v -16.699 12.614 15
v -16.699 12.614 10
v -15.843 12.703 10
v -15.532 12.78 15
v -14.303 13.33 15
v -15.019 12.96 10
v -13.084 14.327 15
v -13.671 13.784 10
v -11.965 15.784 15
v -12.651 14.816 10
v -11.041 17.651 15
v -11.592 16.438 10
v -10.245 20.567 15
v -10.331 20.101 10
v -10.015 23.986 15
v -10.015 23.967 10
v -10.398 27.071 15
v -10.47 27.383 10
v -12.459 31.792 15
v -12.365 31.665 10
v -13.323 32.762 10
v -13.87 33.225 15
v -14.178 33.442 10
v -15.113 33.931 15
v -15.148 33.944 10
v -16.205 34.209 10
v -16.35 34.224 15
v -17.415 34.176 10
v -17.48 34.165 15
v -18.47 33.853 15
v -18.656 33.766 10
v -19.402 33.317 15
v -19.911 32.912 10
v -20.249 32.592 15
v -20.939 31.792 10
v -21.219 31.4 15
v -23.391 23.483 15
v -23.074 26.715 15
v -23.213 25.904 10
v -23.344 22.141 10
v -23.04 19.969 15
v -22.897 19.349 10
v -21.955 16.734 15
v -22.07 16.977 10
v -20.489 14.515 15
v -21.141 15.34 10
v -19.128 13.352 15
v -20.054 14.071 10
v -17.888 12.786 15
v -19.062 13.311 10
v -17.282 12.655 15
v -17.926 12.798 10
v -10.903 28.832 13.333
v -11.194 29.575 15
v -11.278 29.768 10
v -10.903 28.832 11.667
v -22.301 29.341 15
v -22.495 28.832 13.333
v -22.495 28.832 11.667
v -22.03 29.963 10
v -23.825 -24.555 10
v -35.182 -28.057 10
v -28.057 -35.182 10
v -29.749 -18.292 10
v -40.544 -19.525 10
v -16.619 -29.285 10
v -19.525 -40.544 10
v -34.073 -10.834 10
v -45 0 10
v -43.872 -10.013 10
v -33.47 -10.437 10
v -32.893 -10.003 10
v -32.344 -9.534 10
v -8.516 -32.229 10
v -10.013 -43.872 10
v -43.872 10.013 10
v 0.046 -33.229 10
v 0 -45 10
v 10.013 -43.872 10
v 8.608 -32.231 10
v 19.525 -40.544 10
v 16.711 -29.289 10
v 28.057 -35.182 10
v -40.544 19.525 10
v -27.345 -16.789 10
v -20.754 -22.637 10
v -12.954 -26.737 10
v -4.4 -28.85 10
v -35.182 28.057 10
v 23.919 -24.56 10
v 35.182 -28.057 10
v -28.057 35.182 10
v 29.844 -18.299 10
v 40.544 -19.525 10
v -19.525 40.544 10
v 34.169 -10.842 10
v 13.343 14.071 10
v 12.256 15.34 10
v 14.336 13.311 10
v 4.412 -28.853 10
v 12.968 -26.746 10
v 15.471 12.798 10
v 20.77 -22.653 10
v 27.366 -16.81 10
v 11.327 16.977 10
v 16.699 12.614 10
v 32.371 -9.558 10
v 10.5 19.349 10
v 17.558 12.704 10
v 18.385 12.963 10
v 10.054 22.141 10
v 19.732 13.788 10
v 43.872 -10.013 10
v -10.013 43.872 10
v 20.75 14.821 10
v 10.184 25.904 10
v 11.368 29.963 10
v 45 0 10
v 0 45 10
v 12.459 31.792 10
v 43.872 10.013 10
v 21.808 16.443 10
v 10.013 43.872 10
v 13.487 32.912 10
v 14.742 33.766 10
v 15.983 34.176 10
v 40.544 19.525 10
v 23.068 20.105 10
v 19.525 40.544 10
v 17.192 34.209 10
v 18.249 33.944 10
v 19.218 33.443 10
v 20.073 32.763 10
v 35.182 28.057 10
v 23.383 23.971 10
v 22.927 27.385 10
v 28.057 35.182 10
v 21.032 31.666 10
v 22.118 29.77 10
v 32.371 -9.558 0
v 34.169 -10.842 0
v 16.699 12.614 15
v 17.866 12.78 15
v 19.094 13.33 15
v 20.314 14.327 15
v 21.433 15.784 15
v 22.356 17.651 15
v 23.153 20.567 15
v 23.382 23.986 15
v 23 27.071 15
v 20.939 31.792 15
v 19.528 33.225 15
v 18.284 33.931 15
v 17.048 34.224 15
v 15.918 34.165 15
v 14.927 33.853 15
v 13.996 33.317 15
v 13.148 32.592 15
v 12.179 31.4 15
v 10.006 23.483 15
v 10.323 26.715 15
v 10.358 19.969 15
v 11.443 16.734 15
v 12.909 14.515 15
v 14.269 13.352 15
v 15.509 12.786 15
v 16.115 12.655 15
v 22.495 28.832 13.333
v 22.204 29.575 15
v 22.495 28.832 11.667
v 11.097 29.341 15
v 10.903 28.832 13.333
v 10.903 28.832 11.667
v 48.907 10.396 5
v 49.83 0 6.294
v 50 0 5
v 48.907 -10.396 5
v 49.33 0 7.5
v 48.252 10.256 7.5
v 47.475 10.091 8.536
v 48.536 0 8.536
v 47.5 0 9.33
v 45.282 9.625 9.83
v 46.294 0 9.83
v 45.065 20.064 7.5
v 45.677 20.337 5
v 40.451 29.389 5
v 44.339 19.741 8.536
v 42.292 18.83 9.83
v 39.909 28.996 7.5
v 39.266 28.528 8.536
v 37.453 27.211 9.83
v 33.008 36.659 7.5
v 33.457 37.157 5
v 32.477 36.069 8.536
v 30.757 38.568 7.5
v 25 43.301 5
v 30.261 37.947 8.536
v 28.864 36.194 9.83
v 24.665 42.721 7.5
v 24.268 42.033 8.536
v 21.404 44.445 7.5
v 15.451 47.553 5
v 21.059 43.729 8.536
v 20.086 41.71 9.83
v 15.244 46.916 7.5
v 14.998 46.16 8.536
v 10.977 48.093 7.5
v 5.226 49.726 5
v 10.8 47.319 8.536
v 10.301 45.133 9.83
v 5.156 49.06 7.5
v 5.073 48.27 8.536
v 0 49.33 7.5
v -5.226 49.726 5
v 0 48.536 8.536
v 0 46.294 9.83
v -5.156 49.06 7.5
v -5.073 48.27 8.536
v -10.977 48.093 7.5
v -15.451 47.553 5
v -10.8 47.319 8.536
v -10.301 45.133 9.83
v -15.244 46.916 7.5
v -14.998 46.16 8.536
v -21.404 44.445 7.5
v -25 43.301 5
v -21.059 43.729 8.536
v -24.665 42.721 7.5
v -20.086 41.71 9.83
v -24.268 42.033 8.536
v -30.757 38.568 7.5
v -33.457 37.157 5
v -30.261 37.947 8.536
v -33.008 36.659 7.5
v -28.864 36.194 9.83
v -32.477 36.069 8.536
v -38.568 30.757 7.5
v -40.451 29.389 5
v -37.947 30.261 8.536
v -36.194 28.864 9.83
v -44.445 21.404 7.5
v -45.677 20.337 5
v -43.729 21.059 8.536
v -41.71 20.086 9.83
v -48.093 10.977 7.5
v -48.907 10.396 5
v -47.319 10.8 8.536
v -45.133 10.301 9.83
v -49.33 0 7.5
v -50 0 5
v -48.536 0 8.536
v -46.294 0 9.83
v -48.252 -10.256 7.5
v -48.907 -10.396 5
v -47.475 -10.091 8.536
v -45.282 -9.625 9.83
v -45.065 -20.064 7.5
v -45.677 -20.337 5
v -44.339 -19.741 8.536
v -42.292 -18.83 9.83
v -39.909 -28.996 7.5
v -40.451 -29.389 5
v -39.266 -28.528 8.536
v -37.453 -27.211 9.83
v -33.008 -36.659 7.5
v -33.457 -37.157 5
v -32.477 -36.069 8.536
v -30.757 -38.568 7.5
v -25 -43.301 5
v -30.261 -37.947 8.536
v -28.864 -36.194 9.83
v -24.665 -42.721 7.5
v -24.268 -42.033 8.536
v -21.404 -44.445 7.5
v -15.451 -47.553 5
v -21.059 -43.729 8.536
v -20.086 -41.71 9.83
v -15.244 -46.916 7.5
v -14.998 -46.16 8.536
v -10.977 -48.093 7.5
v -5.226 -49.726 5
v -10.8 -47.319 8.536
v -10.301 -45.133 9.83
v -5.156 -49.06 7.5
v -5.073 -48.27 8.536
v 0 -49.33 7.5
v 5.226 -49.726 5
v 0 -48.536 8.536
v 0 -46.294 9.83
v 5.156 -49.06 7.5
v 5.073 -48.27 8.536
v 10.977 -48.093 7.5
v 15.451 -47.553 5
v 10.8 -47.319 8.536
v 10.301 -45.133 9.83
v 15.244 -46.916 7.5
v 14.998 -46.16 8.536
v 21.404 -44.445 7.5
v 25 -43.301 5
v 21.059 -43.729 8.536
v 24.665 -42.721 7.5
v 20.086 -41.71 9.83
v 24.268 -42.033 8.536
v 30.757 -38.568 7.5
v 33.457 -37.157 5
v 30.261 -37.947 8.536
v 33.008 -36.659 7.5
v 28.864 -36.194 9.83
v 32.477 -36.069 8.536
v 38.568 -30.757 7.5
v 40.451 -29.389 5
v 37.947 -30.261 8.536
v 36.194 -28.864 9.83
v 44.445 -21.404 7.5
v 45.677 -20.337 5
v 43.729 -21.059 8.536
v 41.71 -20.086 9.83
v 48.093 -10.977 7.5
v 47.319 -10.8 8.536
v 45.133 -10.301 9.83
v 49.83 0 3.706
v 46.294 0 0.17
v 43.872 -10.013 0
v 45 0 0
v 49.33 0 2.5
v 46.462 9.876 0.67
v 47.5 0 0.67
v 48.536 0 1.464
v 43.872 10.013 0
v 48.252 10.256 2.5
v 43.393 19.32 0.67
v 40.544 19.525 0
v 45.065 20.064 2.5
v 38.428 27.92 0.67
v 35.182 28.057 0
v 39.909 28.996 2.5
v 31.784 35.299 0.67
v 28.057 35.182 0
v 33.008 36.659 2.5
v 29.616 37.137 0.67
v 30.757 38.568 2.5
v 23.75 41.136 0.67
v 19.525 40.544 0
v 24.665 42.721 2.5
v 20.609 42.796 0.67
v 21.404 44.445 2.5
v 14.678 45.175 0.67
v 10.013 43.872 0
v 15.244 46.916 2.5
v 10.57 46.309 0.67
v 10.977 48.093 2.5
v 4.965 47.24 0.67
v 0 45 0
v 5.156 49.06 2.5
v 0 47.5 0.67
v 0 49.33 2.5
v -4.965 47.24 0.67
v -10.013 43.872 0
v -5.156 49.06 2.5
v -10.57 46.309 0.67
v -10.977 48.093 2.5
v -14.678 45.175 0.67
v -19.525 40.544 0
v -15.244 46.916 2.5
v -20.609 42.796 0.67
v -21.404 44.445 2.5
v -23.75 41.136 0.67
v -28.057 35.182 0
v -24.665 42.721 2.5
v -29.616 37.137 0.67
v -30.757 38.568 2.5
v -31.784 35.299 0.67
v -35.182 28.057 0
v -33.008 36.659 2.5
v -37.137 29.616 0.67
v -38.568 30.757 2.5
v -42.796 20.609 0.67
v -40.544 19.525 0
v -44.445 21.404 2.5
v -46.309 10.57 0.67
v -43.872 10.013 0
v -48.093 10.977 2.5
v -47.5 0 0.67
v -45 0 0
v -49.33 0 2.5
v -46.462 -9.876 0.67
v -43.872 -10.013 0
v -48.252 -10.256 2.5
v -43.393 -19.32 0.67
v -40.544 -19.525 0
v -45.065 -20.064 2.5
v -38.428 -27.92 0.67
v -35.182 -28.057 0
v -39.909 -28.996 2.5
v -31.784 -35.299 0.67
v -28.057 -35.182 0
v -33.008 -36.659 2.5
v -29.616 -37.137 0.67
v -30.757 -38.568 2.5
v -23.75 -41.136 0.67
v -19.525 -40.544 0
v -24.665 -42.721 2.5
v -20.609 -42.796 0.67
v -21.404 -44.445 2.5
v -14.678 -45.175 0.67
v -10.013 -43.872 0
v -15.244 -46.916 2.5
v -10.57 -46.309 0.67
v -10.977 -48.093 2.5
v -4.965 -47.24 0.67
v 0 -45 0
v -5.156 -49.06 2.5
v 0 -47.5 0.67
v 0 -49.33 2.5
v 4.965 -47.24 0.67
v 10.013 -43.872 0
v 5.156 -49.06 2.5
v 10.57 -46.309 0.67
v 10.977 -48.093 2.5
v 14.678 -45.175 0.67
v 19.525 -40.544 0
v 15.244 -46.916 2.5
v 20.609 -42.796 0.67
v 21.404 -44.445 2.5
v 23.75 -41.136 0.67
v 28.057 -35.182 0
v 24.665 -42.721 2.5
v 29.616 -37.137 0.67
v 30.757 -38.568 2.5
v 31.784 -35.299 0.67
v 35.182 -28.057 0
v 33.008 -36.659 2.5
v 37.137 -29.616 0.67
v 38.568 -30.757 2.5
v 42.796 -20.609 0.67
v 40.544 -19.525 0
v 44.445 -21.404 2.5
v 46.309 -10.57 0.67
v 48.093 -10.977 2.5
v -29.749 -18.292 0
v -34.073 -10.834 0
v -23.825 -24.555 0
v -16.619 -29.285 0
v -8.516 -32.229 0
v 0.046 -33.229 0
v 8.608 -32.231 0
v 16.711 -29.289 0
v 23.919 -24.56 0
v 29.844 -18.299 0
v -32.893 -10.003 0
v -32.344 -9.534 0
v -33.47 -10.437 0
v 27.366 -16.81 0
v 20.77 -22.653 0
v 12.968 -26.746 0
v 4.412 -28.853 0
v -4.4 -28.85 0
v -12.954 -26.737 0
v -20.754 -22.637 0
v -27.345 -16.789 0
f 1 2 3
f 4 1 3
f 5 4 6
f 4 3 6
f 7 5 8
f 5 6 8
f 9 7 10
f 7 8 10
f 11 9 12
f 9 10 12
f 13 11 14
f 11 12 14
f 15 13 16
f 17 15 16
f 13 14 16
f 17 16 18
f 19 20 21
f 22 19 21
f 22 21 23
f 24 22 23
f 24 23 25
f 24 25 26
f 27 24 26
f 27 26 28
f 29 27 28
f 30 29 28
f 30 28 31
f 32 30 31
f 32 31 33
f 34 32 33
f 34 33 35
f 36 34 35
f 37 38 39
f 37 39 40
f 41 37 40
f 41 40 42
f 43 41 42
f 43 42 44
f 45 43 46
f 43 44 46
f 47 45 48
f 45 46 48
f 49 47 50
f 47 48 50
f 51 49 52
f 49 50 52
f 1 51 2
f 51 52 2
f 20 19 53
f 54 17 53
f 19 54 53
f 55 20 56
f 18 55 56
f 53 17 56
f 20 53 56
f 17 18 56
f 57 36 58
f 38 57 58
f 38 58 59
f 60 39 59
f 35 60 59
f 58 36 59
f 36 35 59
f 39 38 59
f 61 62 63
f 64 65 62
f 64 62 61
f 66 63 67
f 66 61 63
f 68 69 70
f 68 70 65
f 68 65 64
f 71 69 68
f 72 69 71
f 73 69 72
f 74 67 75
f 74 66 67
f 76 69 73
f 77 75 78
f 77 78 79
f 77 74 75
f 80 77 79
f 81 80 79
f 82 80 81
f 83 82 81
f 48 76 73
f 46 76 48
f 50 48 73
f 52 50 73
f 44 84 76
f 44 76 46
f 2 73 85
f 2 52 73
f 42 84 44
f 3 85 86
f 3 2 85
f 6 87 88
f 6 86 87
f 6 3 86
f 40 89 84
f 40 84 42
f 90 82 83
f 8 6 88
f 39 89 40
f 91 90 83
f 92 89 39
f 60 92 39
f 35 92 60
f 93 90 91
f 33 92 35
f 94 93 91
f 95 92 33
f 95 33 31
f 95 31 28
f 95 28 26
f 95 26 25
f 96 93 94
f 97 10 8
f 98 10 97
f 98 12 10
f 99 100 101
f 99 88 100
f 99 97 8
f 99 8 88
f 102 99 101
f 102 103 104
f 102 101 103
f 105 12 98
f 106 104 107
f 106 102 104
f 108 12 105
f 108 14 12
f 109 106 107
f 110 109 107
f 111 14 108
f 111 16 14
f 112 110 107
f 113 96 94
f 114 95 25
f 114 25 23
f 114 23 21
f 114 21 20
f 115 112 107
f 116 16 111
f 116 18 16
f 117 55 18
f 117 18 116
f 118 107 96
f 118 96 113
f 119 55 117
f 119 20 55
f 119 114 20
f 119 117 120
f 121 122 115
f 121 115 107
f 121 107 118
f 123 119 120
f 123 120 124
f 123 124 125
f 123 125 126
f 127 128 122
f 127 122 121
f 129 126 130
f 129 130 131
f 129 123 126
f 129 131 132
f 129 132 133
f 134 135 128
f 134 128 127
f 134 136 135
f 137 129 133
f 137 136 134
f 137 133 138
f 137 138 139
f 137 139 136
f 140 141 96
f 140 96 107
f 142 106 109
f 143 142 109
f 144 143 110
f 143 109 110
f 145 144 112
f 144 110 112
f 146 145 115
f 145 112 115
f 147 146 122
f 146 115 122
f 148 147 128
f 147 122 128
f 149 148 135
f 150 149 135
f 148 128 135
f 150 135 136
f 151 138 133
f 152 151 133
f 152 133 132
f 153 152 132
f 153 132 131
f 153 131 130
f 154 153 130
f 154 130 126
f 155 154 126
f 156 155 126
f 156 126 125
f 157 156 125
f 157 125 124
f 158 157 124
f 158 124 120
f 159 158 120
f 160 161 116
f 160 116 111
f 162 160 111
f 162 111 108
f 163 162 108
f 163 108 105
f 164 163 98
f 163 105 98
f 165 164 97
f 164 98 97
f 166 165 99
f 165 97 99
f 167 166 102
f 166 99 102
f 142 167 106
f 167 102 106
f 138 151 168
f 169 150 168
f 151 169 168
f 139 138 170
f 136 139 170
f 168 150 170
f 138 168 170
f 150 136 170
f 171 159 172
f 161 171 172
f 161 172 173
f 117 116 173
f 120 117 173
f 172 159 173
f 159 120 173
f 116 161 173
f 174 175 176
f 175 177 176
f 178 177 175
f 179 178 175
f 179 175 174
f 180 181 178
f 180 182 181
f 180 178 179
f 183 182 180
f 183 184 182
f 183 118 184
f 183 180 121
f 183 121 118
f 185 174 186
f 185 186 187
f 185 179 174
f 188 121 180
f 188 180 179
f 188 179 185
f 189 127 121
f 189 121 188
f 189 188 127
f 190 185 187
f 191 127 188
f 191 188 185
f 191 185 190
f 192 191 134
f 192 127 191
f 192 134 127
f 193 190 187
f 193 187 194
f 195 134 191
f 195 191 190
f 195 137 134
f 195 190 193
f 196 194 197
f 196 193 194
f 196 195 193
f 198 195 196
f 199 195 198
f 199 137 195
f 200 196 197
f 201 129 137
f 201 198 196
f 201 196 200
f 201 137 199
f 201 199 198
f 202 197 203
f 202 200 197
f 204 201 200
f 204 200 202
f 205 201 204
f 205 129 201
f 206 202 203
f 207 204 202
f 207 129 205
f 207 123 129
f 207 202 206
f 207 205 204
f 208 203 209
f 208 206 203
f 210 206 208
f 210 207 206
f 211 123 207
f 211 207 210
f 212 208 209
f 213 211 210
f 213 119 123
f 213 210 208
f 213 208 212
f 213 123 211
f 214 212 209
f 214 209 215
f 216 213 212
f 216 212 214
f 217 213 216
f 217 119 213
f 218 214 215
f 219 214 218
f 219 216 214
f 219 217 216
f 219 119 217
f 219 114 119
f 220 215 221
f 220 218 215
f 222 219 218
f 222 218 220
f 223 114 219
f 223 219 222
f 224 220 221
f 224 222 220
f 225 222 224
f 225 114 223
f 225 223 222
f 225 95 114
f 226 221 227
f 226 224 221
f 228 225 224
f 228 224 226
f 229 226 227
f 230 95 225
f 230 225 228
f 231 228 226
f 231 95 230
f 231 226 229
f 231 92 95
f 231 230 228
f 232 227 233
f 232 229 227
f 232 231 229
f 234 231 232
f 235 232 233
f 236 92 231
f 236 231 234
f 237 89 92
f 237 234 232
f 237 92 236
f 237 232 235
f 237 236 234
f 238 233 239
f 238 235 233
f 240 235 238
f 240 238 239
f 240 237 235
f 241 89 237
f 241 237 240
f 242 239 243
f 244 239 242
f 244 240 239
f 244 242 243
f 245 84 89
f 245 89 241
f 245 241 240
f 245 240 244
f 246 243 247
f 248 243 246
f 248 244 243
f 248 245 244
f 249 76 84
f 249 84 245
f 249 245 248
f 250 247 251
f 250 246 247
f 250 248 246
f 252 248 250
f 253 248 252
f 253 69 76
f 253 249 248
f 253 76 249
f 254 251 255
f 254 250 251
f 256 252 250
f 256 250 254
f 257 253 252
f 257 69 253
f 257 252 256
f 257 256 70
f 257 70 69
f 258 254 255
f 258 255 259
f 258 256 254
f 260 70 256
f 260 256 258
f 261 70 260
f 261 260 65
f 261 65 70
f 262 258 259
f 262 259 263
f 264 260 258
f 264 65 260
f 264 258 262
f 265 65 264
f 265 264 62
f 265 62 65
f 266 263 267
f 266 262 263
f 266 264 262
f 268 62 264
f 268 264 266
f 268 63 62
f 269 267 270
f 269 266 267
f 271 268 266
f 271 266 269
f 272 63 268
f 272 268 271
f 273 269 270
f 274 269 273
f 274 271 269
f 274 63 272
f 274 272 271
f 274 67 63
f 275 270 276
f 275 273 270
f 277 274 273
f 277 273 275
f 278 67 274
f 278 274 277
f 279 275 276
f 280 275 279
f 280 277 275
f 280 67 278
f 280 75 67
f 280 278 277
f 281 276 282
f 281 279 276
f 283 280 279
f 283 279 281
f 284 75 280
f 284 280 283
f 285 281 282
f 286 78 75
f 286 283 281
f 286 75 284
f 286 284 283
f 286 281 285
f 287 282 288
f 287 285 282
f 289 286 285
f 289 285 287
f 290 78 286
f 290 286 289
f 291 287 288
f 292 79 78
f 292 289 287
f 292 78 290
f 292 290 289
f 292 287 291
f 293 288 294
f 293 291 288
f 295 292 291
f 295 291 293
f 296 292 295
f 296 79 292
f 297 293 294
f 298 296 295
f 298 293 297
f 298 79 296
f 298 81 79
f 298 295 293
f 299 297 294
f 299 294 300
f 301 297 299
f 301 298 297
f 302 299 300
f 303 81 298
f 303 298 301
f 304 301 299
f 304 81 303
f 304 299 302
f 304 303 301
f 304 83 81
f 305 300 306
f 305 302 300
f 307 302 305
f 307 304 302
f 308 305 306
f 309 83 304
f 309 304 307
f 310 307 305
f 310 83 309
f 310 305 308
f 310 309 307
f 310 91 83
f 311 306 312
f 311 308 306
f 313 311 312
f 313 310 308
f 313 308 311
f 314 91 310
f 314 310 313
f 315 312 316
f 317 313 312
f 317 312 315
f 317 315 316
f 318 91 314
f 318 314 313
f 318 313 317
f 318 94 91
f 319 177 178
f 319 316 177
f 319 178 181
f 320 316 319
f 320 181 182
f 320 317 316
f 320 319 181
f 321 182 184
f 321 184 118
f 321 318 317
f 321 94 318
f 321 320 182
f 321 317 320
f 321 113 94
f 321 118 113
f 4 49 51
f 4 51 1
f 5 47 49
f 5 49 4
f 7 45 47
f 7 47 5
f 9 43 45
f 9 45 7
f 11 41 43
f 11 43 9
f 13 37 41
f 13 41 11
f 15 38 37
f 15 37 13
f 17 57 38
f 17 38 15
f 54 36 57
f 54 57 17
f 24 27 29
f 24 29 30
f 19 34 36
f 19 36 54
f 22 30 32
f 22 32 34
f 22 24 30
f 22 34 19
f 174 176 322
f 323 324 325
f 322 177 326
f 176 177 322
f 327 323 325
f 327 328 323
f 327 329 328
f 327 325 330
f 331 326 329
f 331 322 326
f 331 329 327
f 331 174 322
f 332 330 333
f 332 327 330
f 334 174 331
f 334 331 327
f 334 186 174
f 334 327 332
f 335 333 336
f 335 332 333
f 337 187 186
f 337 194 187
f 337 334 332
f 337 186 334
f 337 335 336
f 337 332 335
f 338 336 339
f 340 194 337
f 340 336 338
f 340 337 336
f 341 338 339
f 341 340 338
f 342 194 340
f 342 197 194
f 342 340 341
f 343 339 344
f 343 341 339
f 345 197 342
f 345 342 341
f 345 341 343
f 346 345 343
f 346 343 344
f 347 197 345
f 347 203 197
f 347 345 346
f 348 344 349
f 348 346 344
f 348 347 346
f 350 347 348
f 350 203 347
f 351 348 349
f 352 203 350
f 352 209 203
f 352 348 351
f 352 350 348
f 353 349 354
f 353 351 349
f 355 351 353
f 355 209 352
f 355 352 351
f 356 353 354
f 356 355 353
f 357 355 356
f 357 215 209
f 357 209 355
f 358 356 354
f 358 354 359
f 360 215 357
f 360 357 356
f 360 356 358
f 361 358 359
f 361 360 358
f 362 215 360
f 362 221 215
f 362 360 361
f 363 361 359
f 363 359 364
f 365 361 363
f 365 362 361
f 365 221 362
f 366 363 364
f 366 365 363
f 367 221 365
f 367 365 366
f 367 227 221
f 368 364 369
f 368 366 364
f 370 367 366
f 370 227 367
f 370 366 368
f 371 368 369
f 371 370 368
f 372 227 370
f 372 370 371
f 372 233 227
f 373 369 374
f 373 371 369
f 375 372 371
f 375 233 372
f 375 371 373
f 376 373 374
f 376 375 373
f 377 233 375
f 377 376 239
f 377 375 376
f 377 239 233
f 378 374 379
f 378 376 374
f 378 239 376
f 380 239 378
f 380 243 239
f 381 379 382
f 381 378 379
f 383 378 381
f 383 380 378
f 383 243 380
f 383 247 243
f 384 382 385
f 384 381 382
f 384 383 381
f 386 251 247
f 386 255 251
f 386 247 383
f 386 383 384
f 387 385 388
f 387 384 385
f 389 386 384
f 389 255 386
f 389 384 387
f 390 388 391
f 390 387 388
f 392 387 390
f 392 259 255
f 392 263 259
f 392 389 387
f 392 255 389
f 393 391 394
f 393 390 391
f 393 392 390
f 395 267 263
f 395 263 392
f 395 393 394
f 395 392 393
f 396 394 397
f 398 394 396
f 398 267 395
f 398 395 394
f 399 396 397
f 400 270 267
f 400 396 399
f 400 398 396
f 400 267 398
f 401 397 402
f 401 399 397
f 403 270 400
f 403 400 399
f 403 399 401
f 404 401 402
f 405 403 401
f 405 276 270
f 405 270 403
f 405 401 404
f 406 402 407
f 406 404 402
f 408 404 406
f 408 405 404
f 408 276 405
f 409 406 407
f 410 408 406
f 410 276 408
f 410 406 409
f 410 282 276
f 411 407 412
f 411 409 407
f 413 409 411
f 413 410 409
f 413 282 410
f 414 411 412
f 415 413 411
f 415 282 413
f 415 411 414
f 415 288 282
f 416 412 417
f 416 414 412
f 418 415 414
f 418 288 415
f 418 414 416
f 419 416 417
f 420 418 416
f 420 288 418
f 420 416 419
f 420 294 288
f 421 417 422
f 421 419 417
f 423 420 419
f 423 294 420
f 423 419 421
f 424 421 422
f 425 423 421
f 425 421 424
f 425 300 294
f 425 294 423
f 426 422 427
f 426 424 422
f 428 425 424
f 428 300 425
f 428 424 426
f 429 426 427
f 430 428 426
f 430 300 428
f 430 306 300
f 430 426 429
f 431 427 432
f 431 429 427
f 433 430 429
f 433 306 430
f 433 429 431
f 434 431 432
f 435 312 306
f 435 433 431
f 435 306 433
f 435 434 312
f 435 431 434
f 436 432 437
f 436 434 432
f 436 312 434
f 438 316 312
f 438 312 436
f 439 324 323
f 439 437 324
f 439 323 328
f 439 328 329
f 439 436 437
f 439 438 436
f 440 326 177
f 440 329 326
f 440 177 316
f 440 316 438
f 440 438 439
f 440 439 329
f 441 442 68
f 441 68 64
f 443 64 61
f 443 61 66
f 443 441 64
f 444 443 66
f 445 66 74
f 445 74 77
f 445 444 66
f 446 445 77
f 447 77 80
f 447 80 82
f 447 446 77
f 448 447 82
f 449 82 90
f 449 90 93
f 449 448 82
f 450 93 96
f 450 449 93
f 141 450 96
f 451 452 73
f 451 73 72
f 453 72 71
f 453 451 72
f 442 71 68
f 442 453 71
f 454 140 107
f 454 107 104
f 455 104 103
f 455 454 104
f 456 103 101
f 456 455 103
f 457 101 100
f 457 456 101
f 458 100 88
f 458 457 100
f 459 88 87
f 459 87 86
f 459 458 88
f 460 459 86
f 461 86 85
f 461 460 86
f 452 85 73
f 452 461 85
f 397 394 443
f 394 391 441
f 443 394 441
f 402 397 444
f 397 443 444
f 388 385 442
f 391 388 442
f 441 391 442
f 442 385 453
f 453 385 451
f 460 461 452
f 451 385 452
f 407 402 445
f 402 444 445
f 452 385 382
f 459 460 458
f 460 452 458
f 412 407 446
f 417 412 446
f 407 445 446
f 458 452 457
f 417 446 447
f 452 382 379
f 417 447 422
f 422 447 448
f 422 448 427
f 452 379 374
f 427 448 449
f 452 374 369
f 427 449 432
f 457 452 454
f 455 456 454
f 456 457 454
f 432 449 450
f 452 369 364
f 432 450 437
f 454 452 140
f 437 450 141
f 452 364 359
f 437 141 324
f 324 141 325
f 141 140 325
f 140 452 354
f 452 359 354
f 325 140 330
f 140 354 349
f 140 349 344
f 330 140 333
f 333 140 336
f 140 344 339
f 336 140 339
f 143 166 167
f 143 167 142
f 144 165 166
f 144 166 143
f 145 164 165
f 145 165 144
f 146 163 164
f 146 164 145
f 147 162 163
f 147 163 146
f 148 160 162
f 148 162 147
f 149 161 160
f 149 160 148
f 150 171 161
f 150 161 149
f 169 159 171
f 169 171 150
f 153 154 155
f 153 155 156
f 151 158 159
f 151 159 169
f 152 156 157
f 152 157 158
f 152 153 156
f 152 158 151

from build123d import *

# Parameters (mm, degrees)
F1_R     = 50
F3_DEPTH = 10
F4_DEPTH = 10
F5_DEPTH = 15
F6_R     = 4.99999


# Not quite as in the source:
# - a fillet or chamfer is up to 0.001 mm smaller than in the source, because OpenCascade refuses the exact size


with BuildPart() as f3:
    # F1 (on Top) → F3 (new body)
    with BuildSketch(Plane.XY):
        Circle(F1_R)
    extrude(amount=F3_DEPTH)

    # F2 (on Top) → F4 (cut, through all)
    with BuildSketch(Plane.XY):
        with BuildLine():
            ThreePointArc((-32.3443888766, -9.5336334546), (-33.1781101303, -10.2242371738), (-34.0725456744, -10.8341631392))
            ThreePointArc((-34.0725456744, -10.8341631392), (0.0457985584, -33.2293777169), (34.1692118563, -10.8418875925))
            Line((34.1692118563, -10.8418875925), (32.3708786214, -9.5576704707))
            ThreePointArc((32.3708786214, -9.5576704707), (0.0059751961, -29.1179251405), (-32.3443888766, -9.5336334546))
        make_face()
    extrude(amount=F4_DEPTH, mode=Mode.SUBTRACT)

    # F0 (on Top) → F5 (join)
    with BuildSketch(Plane.XY):
        with BuildLine():
            add(Edge.make_bspline(
                [(-16.6987832636, 12.6141887158), (-5.1069345829, 12.6141887158), (-10.9028589232, 28.8324337453), (-16.6987832636, 45.0506787747), (-22.4947076039, 28.8324337453), (-28.2906319443, 12.6141887158), (-16.6987832636, 12.6141887158)],
                knots=[0, 0, 0, 2.0943951024, 2.0943951024, 4.1887902048, 4.1887902048, 6.2831853072, 6.2831853072, 6.2831853072], degree=2, weights=[1, 0.5, 1, 0.5, 1, 0.5, 1]))
        make_face()
        with BuildLine():
            add(Edge.make_bspline(
                [(16.6987832636, 12.6141887158), (28.2906319443, 12.6141887158), (22.4947076039, 28.8324337453), (16.6987832636, 45.0506787747), (10.9028589232, 28.8324337453), (5.1069345829, 12.6141887158), (16.6987832636, 12.6141887158)],
                knots=[0, 0, 0, 2.0943951024, 2.0943951024, 4.1887902048, 4.1887902048, 6.2831853072, 6.2831853072, 6.2831853072], degree=2, weights=[1, 0.5, 1, 0.5, 1, 0.5, 1]))
        make_face()
    extrude(amount=F5_DEPTH)

    # F6 (radius 5 in the source; OpenCascade refuses exactly that, so slightly less here)
    f6_edges = [f3.edges().sort_by_distance(p)[0] for p in [
        (-50, 0, 10),
        (-50, 0, 0),
    ]]
    fillet(f6_edges, radius=F6_R)


solid = f3.part
